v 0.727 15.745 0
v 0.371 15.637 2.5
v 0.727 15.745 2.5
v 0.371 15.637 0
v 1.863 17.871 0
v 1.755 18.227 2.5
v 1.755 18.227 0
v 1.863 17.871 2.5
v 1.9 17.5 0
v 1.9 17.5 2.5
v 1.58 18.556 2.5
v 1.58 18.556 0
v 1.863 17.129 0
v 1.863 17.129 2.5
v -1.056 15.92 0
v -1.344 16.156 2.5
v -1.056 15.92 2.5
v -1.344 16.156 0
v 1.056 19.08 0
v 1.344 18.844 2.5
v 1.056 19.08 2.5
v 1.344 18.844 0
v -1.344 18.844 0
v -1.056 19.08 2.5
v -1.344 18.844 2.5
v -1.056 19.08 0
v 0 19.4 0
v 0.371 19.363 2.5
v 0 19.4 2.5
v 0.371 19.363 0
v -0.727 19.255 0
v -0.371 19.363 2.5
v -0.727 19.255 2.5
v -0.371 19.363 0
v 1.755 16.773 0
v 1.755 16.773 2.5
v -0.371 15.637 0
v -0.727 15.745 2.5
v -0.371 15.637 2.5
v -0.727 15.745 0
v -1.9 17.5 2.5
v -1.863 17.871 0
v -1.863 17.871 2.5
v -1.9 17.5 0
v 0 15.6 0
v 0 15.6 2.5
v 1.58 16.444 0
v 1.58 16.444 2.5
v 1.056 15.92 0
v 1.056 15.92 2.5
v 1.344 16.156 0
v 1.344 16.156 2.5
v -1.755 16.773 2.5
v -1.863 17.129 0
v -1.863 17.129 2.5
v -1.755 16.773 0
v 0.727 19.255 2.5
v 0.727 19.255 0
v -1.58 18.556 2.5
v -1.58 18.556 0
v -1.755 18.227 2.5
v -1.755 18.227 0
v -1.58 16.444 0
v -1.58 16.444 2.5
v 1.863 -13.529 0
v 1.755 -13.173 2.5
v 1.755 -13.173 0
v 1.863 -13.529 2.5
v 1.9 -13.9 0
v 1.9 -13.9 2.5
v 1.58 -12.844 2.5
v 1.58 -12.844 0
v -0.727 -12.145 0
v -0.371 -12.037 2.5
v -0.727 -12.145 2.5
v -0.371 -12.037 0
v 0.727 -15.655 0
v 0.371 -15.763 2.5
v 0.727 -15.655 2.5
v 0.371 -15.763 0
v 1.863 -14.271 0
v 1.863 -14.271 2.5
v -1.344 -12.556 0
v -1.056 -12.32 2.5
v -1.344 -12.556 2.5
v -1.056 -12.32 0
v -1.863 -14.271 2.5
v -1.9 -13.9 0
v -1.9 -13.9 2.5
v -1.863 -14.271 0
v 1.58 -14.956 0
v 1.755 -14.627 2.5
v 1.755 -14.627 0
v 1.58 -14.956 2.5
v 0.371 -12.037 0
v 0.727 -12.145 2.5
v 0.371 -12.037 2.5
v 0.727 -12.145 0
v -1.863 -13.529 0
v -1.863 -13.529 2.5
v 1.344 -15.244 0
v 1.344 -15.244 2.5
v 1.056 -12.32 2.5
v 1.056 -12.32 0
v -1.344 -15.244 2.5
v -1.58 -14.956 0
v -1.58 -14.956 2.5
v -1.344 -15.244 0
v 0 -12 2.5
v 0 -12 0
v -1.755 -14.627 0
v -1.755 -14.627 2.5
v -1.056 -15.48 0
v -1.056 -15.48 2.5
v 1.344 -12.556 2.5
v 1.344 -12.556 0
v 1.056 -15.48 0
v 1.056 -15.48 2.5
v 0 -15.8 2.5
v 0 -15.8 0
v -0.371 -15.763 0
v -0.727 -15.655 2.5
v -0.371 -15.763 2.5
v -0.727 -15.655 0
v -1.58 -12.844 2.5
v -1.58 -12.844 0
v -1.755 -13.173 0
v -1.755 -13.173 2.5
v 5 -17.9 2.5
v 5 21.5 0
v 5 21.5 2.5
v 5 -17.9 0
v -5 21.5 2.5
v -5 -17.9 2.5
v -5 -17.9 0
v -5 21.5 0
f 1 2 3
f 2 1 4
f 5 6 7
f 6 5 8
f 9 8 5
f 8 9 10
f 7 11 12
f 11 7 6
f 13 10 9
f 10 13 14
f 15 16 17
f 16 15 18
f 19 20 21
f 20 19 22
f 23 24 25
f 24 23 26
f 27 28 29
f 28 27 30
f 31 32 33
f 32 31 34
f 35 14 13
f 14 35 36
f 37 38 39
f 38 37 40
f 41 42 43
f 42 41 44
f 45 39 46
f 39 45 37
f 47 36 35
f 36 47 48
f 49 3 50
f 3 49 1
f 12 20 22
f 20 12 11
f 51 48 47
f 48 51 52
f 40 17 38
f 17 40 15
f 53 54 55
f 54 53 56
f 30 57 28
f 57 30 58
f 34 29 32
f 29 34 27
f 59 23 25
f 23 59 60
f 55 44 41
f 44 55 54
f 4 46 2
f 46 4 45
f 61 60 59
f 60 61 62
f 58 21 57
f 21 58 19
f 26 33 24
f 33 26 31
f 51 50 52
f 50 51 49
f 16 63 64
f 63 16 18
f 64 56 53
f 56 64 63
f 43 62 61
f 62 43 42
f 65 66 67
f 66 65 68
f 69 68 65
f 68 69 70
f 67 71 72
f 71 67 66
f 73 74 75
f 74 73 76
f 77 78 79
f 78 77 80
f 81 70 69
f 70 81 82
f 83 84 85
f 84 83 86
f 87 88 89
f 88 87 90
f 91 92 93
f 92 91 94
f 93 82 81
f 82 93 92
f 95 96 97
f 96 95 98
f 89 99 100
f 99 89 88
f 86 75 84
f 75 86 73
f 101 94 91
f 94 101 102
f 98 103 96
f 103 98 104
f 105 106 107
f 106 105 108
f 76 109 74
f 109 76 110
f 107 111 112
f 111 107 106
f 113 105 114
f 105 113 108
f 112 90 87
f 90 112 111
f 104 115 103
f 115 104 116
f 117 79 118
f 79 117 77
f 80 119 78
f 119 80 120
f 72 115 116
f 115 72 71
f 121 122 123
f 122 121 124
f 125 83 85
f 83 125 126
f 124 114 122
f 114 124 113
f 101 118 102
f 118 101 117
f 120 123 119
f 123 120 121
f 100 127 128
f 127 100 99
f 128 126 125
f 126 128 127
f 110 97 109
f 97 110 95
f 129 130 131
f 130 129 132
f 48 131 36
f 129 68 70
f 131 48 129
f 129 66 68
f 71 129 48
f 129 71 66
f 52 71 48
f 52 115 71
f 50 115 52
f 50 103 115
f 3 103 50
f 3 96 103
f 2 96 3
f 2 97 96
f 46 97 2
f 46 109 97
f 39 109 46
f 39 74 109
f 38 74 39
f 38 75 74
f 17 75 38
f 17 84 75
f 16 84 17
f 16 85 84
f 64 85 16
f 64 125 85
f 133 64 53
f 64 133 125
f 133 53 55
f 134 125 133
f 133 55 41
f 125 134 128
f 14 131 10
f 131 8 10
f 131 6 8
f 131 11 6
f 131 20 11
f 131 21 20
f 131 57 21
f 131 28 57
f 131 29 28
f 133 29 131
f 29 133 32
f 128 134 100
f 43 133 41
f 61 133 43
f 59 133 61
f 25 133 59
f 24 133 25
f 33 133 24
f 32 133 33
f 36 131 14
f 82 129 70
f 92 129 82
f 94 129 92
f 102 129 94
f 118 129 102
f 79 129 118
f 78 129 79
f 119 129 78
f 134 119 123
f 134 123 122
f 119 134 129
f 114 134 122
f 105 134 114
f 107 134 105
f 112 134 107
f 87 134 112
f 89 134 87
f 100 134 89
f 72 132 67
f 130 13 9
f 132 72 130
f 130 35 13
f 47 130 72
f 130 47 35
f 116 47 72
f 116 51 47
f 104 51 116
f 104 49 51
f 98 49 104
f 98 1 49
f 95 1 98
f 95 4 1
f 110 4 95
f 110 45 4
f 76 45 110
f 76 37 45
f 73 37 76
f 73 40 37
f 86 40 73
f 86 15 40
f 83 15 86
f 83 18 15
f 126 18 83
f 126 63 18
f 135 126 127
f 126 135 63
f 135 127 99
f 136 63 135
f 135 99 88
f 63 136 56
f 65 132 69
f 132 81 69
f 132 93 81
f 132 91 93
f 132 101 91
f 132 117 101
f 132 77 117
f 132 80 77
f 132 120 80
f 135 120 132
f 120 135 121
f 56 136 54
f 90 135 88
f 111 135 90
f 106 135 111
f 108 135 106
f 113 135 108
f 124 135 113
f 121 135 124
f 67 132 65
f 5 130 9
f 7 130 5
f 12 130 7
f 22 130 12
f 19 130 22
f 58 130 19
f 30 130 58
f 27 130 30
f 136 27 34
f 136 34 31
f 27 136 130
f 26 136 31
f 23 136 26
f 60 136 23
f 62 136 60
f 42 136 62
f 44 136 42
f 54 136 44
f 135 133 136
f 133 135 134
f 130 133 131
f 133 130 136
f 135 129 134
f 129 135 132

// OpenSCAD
// file: ../head.scad
// Head - shared dimensions for the face plate, shell, camera plate and floor (concept:
// concepts/head_brow_concept.scad). The head sits straight on the turntable plate, no neck.
//
// Frame: origin at the centre of the turntable plate's top; +Y = front (face), +Z = up.
//
//   FACE   head_face.scad: the front of the box part - two round GC9A01 eyes and the 2.08" OLED
//          mouth, each dropped into a pocket from behind (it centres them) and hot-glued
//   SHELL  head_shell.scad: sides, back and the ARCH on top (a half cylinder across the full width
//          and depth); the camera looks out of a small window in the arch's front curve
//   CAMERA head_cam_plate.scad: holds the bare C920 board at cam_tilt, screwed inside the arch
//   FLOOR  head_floor.scad: screws to the turntable plate; the head ESP32-S3 sits on it
include <params.scad>

// ---- outline ------------------------------------------------------------------------------------
hb_w     = 135;              // width (X)
hb_d     = 70;               // depth (Y)
box_h    = 88;               // the box part (face height); the arch adds arch_r on top -> 123
hb_r     = 20;               // bottom corners, seen from the front (the top meets the arch square)
hb_wall  = 2.5;              // shell walls
arch_r   = hb_d / 2;         // 35: the arch spans the full depth; its axis runs along X at
arch_z   = box_h;            //   y = 0, z = box_h
face_t   = 3.0;              // face plate
face_y   = hb_d / 2;         // 35: front surface of the face

// ---- eyes (module dims: params.scad eye_*) ------------------------------------------------------
eye_dx    = 32;              // eye centres at x = +/- eye_dx
eye_z     = 55;              // eye centre height. Modules mount UPSIDE DOWN (pin tab up; the image
                             //   is flipped in software): the tab then points into the free space
                             //   under the arch, away from the mouth
eye_win   = 34;              // window: the 32.4 mm picture + a thin black margin of glass; hides the
                             //   glass edge and its flex cable
eye_skin  = 1.2;             // face material in front of the display
eye_pocket = eye_board_d + 0.5;     // the board drops into this and centres the display
eye_depth = eye_t + 0.3;     // pocket depth behind the skin

// ---- mouth: 2.08" OLED (params.scad oled_*) ---------------------------------------------------------
mouth_z   = 23;              // centre of the visible area: the module's lower edge clears the floor's tabs
mouth_pin = -1;              // the module's pin end points to -X (seen from the front: the left)
m_win     = oled_va + [0.6, 0.6];   // window: the visible area + 0.3 each side
m_skin    = 1.2;
// along X, from the visible area's centre: the glass's and the board's centres (pins at -X)
m_glass_dx = -mouth_pin * (oled_glass_x + oled_glass[0] / 2 - (oled_va_x + oled_va[0] / 2));   // +2.56
m_pcb_dx   = -mouth_pin * (oled_pcb[0] / 2 - (oled_va_x + oled_va[0] / 2));                     // +1.82

// ---- camera: bare C920 board, in the arch ----------------------------------------------------------
cam_tilt  = 18;              // fixed, up. Lens ~278 mm above the desk: eyes 300-500 mm high at
                             //   300-600 mm are 2..37 deg up; the 43 deg view (16:9) at 18 covers -3..40
cam_board = [80, 22];        // MEASURED (eye_test_stand.scad)
cam_board_t = 1.3;
cam_lens_h  = 14.0;          // board front -> front of the lens
cam_lens_d  = 11;            // lens barrel across its flanges
cam_win     = cam_lens_d + 2 * 2;   // window round the lens (eye test stand, print 2: small is best)
cam_recess  = 0.5;           // lens front this far inside the arch's surface
// the lens axis runs radially out of the arch at cam_tilt: lens front at arch_r - cam_recess
cam_r_lens  = arch_r - cam_recess;                  // 34.5 from the arch axis
cam_r_board = cam_r_lens - cam_lens_h;              // 20.5: board front

// ---- joints -------------------------------------------------------------------------------------------
// face plate -> shell: four M3 screws from inside, through tabs on the shell, into inserts in the
// face's bosses
face_boss_d   = 8;
face_boss_len = 9;           // behind the face's back
face_bosses   = [[-55, 14], [55, 14], [-58, 64], [58, 64]];   // (x, z): the upper pair low enough to
                                                                //   clear the camera plate's flanges

// floor: head_floor.scad. It screws DOWN into four inserts in the turntable plate (head-frame
// positions below); the shell hooks onto it at the front (two tongues on the face plate into slots
// in the floor's front tabs) and screws to it at the back (two M3 through the back wall)
floor_t      = 4.5;          // pockets underneath clear the lazy Susan's M5 nuts + bolt tips
floor_clr    = 0.4;          // gap to the shell's walls, each side
floor_x      = 47;           // half-width: the shell's open bottom is +/-47.5 (rounded corners)
floor_y      = [-hb_d / 2 + hb_wall + floor_clr, face_y - face_t - floor_clr];
floor_mounts = [[-22, -22], [22, -22], [-22, 22], [22, 22]];  // M3 down into the turntable plate
head_rot_in_pulley = 45;     // the head's frame in turntable_pulley.scad's: there the motor is at 0 deg
                             //   when the head looks ahead, and Level 2 has it at motor_a = -45, so the
                             //   head's +Y (90 deg) is at 135
floor_nuts   = [[-50.5, 0], [50.5, 0]];   // the turntable plate's M5 nuts under the floor
floor_hole_d = 40;           // cables down into the turntable's hollow tube
back_screws  = [-30, 30];    // x of the two M3 screws through the back wall
back_screw_z = 10;
tongue_x     = [-30, 30];    // the face plate's tongues
tongue       = [10, 3, 7];   // width (X), height (Z), length (Y, back from the face plate)
tongue_z     = 7;            // centre height (under the mouth's collar)
// the head ESP32-S3 (Seeed XIAO ESP32S3, 21 x 17.8): in a pocket on the floor, USB-C toward the hole
mcu          = [21.0, 17.8];
mcu_c        = [33, 0];      // centre; long axis along X, USB at the -X end

module rr2d(w, h, r) { offset(r = r) square([w - 2 * r, h - 2 * r], center = true); }

// front outline of the box part: rounded bottom corners, square top; z = 0 .. h
module low2d(w = hb_w, h = box_h, r = hb_r) {
    hull() {
        for (sx = [-1, 1]) translate([sx * (w / 2 - r), r]) circle(r = r, $fn = 96);
        translate([-w / 2, h - 1]) square([w, 1]);
    }
}

// where the lens sits: frame at the lens front, looking along +Y (rotated cam_tilt up)
module at_lens() {
    translate([0, 0, arch_z]) rotate([cam_tilt, 0, 0]) translate([0, cam_r_lens, 0]) children();
}
// file: ../head_cam.scad
// Head camera mount - shared by head_cam_plate.scad, head_cam_strap.scad and head_shell.scad.
//
// LENS FRAME: origin at the front of the lens; +Y = the view direction, +Z = "up" across the
// board, X = along the board (same X as the head). at_lens() (head.scad) places it in the head:
// the lens axis runs radially out of the arch, cam_tilt up.
//
// The bare C920 board (80 x 22) lies against the plate's BACK face, lens forward through it, as on
// the eye test stand (eye_test_stand.scad - its pocket / notch / bracket layout is proven):
//   * through the plate: the lens holder (square), the board's front parts (44 x 22), the coils'
//     bay, two notches for the microphones (they also index the board side to side)
//   * behind: two bosses with M3 inserts; a flat strap (head_cam_strap.scad) screws onto them
//     across the board's back, 1.7 mm clear of its back parts
//   * at each end a FLANGE against the side wall: two M3 screws from outside the head, through
//     the wall, into inserts in the flange
include <head.scad>

cam_plate_t  = 2.5;
cam_y_board  = -cam_lens_h;                 // -14: board front = plate back face
cam_y_front  = cam_y_board + cam_plate_t;   // -11.5: plate front face
cam_z_range  = [-18, 21.5];                 // plate extent across the board (Z): inside the arch
cam_x_flange = hb_w / 2 - hb_wall;          // 65: flange outer faces against the side walls
cam_flange_t = 7;                           // thick enough for an insert (bore along X)
cam_flange_y = [-27, cam_y_front];          // flange extent along Y
cam_mount_pts = [[-21, 12], [-21, -10]];    // [y, z] of the two screws in each flange
cam_lens_hole = 16.5;                       // square, for the 14 x 14 lens holder
cam_comp     = [44, 22];                    // the board's front parts (through)
cam_coil     = [4, 5];                      // bay off the pocket's -X side, from z = 0 up
cam_mic_d    = 6.1 + 0.7;
cam_mic_x    = 69.2 / 2 + 6.1 / 2;          // 37.65: microphone centres
cam_strap_holes = [17.5, -13.9];            // Z of the strap's screws (as the stand's bracket)
cam_boss_h   = 6;                           // bosses behind the plate: the strap lies on them
cam_boss_d   = 8;

// a point in the lens frame -> head frame (matches at_lens())
function cam_to_head(p) = let(y = p[1] + cam_r_lens, z = p[2])
    [p[0], y * cos(cam_tilt) - z * sin(cam_tilt), arch_z + y * sin(cam_tilt) + z * cos(cam_tilt)];
// main file
// Head camera strap - a flat bar across the back of the C920 board, screwed (2 x M3 x 6) onto the
// camera plate's two bosses. It lies 1.7 mm clear of the board's back parts and keeps the board
// against the plate.
//
// PRINT flat (as modelled), no supports.
include <../head_cam.scad>

strap_w = 10;
strap_t = 2.5;
z0 = cam_strap_holes[1] - cam_boss_d / 2;
z1 = cam_strap_holes[0] + cam_boss_d / 2;

module cam_strap() {
    difference() {
        translate([-strap_w / 2, z0, 0]) cube([strap_w, z1 - z0, strap_t]);
        for (z = cam_strap_holes) translate([0, z, -1]) cylinder(d = 3.4 + cal_hole, h = strap_t + 2, $fn = 32);
    }
}

cam_strap();
